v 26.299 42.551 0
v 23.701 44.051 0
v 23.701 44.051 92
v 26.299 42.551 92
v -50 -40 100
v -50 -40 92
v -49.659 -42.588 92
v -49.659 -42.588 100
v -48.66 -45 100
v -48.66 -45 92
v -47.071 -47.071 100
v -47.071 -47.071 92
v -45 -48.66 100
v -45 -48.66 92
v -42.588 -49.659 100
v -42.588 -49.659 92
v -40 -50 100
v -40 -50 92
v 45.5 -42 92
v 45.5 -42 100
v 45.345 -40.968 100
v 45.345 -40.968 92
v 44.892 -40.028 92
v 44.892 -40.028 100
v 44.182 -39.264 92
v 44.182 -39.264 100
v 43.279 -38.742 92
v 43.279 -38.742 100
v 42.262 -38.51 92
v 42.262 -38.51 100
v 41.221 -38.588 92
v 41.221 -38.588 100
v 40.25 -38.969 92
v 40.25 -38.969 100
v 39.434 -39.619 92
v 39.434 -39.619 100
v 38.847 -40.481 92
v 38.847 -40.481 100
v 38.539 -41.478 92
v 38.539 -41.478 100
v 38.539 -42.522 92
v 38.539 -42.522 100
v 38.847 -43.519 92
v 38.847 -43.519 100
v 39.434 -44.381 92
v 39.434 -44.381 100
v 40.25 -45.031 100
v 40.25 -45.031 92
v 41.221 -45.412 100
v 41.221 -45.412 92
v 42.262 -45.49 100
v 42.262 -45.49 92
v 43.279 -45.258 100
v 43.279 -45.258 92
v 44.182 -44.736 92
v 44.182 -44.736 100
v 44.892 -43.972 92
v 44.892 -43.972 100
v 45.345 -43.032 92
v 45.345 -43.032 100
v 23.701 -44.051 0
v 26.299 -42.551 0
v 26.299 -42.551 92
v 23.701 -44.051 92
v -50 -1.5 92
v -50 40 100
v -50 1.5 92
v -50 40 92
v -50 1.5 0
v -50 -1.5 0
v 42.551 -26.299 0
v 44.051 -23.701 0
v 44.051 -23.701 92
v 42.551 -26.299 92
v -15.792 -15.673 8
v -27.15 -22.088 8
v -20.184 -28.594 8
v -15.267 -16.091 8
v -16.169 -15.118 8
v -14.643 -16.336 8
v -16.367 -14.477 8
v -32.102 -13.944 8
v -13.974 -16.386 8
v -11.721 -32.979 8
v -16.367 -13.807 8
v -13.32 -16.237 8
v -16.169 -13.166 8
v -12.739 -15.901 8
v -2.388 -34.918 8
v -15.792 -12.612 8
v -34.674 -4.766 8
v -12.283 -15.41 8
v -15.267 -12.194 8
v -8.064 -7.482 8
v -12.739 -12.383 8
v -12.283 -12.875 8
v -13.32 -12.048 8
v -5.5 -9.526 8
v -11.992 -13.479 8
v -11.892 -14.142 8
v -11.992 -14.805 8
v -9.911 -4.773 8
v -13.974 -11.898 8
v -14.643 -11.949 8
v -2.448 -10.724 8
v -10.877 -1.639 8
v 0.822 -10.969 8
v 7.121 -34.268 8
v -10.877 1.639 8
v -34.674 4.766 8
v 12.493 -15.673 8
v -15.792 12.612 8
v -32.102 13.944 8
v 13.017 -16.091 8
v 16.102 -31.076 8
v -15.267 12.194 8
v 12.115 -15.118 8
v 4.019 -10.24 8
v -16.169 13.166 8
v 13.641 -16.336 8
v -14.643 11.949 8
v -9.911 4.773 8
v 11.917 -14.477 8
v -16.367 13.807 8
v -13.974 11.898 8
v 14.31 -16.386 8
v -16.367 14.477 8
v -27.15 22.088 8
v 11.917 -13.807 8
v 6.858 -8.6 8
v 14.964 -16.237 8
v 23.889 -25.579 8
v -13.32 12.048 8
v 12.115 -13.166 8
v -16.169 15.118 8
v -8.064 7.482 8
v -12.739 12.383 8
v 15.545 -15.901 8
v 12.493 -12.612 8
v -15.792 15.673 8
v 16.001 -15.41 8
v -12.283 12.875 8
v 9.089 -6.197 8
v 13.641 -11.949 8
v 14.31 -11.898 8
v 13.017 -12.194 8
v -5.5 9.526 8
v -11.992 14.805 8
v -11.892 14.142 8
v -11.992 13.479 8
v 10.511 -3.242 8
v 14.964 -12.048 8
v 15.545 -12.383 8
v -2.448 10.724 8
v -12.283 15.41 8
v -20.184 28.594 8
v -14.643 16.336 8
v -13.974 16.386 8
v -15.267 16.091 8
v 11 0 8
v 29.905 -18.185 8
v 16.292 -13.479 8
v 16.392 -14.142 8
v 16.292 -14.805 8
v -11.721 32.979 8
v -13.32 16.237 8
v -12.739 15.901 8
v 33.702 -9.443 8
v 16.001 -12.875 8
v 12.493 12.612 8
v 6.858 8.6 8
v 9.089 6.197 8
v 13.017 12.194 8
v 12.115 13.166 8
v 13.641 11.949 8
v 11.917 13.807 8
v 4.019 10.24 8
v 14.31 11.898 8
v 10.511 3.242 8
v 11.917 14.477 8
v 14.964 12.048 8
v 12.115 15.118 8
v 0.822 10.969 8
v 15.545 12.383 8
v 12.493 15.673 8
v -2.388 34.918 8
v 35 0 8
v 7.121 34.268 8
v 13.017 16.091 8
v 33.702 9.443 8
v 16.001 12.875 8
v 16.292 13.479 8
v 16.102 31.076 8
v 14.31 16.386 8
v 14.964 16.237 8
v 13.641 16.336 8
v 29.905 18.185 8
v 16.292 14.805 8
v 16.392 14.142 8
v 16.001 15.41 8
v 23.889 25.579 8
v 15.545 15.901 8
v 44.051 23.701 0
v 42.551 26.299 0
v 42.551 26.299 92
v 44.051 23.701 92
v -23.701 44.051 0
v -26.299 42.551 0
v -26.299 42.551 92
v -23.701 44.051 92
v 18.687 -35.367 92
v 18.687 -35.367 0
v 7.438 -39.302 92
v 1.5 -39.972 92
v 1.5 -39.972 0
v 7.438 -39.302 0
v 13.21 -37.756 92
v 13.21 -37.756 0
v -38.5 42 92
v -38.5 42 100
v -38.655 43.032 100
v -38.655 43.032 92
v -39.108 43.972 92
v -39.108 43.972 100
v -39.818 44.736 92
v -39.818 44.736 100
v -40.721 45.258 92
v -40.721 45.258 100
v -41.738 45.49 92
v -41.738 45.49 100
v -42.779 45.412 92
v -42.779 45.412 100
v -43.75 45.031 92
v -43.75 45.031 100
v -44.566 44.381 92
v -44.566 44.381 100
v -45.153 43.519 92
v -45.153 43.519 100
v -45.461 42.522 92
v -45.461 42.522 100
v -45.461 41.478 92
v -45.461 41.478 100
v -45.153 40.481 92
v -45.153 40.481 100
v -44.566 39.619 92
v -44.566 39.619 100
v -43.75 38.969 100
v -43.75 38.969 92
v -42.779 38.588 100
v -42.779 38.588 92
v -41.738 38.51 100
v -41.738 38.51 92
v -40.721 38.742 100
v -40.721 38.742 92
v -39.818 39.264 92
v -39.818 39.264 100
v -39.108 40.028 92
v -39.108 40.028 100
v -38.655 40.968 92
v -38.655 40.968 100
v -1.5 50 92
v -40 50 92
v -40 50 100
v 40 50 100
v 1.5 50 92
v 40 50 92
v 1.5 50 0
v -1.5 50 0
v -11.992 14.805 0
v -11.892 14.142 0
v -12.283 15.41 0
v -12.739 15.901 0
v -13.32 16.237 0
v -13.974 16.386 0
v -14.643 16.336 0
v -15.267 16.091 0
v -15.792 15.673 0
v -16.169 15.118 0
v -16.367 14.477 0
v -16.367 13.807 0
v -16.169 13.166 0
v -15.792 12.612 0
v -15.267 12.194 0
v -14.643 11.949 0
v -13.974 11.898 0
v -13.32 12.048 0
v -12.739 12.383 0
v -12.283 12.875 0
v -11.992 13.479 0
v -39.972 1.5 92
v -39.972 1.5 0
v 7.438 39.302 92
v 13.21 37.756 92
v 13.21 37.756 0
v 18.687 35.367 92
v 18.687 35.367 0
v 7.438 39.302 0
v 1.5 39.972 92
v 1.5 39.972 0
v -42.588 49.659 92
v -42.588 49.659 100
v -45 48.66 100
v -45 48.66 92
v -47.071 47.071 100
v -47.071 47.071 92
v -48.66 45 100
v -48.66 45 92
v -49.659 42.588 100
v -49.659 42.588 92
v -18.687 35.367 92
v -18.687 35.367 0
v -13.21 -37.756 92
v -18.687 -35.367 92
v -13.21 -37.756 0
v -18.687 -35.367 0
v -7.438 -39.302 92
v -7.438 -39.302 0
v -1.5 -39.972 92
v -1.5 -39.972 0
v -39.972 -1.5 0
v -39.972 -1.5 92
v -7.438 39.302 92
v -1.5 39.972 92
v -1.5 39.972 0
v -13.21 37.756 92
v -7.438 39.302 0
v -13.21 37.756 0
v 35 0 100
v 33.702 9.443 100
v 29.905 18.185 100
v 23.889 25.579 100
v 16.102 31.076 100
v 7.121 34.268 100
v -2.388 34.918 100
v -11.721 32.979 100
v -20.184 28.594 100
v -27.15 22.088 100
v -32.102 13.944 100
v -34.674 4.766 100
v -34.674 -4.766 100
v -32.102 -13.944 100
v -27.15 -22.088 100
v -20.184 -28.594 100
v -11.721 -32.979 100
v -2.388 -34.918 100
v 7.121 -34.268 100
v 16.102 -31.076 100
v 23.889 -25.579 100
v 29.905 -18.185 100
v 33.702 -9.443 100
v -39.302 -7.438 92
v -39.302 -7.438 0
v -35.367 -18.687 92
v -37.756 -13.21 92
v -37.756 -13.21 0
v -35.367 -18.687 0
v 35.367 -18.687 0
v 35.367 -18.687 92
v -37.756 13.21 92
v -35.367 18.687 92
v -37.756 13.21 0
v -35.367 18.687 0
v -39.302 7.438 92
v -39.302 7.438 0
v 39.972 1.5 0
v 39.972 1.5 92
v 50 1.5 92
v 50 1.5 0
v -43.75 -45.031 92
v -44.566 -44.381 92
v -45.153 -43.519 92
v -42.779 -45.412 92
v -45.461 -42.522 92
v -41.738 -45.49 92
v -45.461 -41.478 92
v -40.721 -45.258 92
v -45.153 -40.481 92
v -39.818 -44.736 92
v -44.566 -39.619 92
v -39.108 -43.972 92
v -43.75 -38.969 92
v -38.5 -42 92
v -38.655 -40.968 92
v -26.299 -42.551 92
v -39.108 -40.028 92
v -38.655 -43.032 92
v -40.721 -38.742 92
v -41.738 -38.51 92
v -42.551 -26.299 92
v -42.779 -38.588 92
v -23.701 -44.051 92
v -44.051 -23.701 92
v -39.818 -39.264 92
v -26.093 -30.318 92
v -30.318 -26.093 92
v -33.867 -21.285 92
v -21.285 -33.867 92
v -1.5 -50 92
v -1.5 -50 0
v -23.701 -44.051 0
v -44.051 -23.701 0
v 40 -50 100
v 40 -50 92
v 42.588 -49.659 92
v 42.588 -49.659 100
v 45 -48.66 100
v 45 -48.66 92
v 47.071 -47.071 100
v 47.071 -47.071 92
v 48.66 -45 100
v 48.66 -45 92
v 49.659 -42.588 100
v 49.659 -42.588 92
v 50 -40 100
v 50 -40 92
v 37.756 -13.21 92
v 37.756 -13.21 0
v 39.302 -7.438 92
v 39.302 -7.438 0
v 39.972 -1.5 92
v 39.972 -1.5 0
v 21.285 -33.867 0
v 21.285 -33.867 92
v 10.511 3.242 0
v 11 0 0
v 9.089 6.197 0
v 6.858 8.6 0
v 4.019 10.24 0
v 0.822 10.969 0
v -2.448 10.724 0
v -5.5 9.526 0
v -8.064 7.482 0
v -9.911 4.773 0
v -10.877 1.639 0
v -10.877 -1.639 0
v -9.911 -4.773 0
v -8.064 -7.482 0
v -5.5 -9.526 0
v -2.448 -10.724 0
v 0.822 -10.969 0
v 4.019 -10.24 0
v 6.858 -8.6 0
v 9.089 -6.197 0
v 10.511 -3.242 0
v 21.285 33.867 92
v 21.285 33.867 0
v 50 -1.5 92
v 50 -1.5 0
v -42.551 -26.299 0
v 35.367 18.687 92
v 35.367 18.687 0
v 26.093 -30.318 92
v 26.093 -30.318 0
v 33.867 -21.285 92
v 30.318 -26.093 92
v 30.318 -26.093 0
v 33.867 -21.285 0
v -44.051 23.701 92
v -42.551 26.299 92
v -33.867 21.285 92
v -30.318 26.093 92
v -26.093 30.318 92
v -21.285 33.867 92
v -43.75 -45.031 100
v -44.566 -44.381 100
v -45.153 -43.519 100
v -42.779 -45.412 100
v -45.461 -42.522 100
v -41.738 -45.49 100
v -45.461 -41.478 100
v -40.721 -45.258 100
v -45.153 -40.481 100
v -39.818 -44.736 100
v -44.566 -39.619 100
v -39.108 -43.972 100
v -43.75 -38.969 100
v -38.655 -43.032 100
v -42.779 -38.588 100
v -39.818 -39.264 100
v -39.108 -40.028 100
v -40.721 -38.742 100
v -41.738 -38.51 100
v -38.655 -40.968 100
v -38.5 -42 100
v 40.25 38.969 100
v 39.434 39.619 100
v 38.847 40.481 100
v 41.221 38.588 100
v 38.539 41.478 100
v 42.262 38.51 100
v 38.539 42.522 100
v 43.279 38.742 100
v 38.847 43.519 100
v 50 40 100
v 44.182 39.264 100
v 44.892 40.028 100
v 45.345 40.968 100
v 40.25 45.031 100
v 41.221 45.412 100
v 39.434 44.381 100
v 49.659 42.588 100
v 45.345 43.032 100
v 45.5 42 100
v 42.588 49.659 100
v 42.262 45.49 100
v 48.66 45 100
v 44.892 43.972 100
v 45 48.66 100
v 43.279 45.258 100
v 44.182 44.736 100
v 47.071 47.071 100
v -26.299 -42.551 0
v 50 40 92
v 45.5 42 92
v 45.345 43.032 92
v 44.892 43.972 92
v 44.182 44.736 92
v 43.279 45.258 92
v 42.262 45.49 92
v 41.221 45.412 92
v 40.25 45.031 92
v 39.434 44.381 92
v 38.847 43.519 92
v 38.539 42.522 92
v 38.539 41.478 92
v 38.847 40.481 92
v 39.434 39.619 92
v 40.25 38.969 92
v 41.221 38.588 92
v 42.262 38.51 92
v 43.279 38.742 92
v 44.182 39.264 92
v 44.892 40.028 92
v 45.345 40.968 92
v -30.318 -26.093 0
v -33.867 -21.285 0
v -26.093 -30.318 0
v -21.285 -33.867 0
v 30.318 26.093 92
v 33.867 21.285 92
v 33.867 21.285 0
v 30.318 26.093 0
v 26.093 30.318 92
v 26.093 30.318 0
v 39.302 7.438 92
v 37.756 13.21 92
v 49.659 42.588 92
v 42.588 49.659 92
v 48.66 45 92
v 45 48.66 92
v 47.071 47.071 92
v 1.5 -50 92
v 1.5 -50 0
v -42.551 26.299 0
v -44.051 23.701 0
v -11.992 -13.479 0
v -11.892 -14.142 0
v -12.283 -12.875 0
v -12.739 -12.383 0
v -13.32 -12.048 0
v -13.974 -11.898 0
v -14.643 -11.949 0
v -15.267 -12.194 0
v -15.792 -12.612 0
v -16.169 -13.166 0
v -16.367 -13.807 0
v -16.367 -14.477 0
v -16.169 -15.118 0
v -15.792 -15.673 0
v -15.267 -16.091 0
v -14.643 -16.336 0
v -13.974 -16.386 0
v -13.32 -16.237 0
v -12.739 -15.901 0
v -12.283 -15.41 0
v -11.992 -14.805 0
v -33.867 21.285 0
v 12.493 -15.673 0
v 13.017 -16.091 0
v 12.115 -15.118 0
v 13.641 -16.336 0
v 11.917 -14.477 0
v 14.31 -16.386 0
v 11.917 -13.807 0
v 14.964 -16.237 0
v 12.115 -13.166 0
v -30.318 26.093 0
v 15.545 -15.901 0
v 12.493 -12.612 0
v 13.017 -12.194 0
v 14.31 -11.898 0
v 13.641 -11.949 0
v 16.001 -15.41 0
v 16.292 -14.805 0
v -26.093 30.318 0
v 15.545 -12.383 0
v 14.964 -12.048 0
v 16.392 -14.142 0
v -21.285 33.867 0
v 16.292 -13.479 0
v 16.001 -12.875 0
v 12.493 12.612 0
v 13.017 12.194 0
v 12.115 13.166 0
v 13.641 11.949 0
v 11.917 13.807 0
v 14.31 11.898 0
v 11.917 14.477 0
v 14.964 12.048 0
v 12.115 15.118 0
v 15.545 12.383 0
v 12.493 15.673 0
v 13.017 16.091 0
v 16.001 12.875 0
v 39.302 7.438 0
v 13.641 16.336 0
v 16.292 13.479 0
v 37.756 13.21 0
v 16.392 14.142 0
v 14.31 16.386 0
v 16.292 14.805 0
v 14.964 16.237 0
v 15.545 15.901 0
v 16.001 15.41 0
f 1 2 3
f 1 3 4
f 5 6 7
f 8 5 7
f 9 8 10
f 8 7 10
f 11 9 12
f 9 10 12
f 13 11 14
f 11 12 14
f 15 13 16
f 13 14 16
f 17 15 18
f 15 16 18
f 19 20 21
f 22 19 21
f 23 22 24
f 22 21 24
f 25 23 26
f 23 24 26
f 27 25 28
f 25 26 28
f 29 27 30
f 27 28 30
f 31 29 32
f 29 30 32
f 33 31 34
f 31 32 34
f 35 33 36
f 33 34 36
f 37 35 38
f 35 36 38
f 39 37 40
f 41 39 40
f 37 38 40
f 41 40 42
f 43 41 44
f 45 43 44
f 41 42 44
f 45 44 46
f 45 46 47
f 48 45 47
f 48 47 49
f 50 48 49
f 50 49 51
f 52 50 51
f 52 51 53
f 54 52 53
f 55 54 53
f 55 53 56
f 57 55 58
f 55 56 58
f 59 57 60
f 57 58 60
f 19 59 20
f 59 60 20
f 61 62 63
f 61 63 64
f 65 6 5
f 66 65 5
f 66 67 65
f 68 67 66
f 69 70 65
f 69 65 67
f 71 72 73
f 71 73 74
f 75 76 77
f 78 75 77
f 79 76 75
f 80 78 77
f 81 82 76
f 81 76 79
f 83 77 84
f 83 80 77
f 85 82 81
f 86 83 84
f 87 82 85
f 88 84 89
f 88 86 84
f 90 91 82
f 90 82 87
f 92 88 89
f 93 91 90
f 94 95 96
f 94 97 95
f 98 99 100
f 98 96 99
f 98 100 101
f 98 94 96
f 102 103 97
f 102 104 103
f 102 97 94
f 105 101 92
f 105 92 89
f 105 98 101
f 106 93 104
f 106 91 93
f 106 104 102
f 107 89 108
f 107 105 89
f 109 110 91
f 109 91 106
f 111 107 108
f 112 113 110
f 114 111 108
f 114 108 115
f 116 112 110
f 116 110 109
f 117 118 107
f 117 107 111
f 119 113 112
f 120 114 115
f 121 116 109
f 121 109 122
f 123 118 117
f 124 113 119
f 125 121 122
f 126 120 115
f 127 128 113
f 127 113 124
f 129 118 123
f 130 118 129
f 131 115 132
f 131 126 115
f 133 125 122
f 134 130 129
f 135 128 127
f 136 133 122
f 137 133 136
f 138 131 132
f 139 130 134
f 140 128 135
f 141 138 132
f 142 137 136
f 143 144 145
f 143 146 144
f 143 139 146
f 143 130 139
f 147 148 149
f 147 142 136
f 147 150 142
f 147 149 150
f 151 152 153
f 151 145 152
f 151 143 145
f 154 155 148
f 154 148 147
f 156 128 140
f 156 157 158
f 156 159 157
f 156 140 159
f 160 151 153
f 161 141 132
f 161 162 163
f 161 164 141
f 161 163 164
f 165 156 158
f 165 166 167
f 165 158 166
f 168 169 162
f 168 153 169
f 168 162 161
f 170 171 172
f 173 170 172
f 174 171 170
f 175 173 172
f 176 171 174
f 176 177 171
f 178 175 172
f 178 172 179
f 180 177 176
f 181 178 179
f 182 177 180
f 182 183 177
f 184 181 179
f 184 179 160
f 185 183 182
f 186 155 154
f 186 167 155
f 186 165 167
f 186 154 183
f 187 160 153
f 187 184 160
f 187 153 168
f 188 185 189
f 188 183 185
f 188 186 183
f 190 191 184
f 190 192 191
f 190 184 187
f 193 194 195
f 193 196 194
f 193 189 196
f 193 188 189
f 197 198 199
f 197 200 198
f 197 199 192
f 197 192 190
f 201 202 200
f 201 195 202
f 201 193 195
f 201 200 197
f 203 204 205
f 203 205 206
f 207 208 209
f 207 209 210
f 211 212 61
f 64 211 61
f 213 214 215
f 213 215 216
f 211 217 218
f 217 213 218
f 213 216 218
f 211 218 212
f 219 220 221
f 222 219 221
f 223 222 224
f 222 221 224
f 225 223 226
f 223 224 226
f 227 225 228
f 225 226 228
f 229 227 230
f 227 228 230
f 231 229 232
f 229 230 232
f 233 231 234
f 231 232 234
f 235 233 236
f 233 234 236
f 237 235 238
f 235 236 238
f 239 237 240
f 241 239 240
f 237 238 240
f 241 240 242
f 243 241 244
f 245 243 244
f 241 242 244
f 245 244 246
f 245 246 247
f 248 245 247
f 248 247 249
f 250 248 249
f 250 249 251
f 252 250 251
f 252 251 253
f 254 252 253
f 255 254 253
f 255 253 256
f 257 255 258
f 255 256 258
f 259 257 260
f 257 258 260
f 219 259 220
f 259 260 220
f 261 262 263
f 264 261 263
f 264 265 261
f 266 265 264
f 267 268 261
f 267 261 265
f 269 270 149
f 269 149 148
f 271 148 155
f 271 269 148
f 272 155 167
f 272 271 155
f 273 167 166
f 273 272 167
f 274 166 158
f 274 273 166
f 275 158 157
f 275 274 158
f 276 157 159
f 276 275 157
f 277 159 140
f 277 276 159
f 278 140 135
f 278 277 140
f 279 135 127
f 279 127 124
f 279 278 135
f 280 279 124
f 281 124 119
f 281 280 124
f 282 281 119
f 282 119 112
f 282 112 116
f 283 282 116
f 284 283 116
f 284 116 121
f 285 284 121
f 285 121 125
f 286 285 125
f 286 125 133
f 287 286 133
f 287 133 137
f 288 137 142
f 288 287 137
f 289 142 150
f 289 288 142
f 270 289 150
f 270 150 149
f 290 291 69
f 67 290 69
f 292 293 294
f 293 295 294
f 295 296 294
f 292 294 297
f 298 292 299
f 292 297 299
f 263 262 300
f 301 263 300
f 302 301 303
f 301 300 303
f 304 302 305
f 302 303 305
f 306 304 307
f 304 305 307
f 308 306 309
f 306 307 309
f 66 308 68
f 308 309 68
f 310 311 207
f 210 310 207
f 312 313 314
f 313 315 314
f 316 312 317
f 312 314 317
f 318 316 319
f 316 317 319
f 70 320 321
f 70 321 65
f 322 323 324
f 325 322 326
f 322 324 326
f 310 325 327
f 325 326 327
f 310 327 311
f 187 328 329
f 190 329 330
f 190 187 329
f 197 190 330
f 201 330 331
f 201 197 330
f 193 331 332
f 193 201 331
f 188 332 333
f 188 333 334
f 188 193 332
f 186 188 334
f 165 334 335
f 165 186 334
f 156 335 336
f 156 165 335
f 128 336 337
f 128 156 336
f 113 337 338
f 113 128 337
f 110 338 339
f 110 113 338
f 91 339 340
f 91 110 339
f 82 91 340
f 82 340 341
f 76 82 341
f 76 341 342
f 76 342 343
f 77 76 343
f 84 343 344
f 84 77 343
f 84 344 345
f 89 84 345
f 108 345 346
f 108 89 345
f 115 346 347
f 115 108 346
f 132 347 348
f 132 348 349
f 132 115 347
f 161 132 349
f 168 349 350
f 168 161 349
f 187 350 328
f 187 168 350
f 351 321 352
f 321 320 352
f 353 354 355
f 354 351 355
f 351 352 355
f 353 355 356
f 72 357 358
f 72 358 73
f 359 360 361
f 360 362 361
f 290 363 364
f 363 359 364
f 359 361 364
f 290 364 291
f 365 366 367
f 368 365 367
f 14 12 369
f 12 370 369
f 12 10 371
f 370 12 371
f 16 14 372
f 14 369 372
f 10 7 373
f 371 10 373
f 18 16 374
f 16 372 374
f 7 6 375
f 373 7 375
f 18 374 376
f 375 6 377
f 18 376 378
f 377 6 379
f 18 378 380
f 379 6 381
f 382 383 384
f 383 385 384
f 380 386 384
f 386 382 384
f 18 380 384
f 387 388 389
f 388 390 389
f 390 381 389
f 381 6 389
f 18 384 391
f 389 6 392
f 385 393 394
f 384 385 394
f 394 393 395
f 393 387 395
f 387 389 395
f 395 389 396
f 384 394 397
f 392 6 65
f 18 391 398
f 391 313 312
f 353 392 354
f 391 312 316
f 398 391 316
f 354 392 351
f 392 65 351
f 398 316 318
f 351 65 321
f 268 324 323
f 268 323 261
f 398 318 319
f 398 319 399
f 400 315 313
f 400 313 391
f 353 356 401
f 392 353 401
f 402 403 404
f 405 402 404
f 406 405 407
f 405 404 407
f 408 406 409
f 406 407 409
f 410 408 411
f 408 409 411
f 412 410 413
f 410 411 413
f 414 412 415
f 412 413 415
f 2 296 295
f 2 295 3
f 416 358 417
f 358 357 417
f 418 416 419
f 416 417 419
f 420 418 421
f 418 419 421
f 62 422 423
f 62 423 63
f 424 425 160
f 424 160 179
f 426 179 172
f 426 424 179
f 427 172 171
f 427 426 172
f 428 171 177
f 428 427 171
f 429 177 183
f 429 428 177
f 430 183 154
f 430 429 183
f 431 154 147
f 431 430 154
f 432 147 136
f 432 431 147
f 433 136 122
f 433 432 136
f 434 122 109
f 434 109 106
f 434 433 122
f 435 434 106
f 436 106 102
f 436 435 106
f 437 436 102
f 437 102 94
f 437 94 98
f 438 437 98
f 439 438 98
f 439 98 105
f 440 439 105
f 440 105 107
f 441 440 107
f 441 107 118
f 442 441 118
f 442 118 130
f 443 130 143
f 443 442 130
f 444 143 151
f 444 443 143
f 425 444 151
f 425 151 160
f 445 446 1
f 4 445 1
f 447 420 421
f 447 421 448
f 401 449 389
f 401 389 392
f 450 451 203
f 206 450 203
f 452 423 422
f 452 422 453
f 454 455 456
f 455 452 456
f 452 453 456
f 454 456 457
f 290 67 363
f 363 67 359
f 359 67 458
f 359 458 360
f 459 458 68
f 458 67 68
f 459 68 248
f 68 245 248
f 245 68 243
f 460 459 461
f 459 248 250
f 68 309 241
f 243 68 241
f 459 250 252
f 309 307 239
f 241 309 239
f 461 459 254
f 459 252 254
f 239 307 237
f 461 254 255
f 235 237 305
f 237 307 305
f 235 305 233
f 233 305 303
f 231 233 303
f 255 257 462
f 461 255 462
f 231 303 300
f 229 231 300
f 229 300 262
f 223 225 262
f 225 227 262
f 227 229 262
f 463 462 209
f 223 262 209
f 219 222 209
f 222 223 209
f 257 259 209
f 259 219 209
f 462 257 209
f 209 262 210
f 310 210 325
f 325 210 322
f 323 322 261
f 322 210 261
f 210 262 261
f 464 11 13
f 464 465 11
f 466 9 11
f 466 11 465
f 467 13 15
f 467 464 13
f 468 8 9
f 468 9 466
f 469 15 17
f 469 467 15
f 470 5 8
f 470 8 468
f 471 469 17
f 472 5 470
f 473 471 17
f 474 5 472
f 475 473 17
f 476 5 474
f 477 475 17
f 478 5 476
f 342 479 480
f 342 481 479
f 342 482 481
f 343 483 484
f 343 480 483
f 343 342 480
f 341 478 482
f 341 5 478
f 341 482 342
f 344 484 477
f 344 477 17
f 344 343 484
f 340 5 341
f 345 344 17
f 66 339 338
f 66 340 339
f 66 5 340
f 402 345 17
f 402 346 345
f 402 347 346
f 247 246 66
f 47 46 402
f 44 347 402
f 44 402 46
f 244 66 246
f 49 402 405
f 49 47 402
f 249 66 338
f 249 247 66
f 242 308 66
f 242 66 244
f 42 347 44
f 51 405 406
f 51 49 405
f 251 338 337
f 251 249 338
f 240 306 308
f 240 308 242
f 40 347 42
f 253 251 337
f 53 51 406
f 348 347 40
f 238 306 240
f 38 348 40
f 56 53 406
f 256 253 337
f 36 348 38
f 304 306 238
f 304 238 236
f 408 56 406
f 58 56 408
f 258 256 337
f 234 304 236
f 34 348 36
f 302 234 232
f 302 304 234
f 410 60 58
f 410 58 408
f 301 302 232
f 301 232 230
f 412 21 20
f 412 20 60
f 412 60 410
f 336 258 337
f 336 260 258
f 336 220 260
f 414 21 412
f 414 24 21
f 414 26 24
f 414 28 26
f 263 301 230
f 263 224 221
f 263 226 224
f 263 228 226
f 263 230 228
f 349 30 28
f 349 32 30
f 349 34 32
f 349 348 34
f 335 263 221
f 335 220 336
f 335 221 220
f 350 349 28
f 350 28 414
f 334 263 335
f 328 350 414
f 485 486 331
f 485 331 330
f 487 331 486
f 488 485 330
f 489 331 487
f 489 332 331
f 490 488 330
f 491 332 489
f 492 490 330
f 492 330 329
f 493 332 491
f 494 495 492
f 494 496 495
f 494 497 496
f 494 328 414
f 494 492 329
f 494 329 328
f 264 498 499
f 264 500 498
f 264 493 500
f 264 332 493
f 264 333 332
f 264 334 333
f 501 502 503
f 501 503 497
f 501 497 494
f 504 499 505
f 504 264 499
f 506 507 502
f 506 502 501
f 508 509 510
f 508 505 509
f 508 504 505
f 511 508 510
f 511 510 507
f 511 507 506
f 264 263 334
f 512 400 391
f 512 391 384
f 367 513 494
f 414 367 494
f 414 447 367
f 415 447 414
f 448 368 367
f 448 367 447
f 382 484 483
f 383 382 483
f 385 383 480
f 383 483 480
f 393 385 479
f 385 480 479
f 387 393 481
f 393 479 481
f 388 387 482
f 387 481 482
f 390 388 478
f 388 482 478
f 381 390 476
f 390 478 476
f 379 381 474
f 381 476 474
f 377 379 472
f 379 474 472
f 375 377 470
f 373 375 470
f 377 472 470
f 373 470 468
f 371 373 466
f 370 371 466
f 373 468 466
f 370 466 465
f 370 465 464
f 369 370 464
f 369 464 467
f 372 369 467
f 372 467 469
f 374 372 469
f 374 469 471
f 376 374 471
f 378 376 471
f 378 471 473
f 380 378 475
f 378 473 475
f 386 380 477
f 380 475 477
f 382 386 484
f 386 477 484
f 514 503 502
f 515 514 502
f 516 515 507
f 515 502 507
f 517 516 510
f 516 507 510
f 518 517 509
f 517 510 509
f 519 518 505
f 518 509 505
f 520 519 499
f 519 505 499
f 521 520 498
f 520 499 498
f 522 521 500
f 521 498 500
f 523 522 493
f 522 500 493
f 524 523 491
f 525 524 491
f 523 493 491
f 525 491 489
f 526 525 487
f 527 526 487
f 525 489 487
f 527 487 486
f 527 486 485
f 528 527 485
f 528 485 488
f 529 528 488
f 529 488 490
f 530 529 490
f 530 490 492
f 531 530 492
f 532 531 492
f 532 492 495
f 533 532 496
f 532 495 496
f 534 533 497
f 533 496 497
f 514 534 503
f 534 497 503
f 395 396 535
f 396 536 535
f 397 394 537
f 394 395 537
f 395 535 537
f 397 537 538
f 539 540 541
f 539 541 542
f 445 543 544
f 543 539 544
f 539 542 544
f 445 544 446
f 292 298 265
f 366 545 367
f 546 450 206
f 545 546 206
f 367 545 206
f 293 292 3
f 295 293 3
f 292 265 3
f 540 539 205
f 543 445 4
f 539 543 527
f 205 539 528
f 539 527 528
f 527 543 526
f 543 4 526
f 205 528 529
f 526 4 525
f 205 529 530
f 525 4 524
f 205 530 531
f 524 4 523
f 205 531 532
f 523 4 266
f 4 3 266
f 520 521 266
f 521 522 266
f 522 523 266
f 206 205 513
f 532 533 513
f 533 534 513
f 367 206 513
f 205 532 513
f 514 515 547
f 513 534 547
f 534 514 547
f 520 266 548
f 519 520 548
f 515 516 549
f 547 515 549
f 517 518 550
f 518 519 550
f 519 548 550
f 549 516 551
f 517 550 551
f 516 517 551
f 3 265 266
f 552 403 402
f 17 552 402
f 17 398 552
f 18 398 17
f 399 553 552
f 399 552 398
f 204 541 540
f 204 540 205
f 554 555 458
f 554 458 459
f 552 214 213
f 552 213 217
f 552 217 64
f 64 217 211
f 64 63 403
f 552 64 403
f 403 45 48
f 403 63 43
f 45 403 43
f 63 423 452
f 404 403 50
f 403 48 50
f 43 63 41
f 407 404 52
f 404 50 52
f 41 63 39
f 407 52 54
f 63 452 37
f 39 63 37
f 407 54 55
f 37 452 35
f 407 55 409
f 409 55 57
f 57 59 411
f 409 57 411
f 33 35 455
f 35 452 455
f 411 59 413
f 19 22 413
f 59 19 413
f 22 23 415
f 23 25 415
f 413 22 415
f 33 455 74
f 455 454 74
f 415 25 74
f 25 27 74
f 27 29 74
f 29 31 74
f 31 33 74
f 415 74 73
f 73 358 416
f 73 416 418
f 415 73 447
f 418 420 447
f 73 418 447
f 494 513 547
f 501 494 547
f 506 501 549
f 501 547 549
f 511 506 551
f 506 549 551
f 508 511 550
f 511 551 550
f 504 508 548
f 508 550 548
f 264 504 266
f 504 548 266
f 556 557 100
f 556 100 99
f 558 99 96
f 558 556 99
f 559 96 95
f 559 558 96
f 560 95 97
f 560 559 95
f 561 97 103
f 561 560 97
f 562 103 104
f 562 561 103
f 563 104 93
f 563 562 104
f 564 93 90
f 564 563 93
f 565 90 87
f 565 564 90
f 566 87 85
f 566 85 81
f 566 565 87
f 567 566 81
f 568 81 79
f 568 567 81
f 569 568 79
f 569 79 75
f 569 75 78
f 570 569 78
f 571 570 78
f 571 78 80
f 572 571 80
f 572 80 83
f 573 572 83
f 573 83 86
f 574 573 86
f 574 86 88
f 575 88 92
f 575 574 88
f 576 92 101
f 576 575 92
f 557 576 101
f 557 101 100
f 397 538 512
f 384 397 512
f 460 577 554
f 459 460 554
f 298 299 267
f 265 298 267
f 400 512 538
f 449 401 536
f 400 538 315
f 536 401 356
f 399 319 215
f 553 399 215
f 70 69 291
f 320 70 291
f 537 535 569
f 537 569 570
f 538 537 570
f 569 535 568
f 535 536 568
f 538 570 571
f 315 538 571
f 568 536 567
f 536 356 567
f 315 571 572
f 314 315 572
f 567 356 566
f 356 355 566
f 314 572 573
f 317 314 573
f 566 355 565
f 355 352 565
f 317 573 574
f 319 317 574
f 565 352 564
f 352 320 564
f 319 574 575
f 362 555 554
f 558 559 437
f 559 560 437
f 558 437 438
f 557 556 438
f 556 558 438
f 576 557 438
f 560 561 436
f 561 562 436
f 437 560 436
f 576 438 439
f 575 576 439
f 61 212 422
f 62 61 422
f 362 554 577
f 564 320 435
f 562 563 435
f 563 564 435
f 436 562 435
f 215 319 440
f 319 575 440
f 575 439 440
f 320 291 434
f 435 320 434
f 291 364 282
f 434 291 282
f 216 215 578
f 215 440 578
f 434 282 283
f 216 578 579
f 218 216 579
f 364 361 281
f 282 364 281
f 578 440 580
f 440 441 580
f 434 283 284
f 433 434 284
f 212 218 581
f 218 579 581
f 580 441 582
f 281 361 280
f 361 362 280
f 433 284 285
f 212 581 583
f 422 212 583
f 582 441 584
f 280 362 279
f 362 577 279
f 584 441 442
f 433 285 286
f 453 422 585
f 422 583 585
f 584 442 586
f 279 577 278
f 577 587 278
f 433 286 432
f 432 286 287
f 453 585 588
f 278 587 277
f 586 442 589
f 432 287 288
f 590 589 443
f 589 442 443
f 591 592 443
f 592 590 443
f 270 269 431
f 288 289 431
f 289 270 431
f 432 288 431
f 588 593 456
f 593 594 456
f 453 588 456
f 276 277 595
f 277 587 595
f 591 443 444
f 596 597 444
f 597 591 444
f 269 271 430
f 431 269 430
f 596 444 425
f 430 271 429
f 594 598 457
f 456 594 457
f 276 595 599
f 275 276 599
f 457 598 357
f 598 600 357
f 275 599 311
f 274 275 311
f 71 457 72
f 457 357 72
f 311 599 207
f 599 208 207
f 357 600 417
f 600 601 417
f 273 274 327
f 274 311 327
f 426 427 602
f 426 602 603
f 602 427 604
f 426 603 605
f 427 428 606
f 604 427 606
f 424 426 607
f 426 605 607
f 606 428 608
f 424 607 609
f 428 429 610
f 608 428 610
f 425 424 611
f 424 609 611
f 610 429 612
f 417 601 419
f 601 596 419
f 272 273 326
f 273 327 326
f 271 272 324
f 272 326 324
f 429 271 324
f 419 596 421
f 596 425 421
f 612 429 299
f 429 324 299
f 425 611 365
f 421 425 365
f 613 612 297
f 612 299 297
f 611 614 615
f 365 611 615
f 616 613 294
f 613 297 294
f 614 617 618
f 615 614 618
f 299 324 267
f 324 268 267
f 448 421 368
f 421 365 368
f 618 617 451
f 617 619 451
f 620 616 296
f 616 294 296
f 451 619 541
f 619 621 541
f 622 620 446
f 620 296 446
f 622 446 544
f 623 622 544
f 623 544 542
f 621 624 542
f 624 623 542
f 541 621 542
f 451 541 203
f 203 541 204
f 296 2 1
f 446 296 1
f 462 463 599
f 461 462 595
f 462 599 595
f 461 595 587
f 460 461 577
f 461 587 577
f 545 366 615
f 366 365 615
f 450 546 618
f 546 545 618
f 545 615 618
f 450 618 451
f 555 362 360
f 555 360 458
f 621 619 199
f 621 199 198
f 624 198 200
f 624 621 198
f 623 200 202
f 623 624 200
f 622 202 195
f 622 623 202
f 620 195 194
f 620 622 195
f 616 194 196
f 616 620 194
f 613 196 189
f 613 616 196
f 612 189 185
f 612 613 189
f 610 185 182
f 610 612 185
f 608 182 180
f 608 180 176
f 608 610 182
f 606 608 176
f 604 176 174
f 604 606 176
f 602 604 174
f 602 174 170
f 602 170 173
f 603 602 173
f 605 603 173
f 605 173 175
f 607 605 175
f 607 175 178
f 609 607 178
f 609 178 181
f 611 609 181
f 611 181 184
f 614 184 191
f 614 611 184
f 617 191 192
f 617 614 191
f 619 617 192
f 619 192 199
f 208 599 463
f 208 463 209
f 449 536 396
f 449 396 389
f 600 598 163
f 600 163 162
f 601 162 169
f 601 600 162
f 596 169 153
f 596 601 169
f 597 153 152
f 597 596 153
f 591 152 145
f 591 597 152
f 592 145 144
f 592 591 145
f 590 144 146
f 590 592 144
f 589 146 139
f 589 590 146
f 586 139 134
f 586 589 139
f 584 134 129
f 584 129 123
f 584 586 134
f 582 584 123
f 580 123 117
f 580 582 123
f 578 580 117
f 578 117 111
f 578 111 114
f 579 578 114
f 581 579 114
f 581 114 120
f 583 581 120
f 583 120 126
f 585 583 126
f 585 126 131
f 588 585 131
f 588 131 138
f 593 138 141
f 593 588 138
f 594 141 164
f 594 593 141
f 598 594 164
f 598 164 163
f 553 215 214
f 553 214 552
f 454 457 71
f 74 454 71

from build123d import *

# Parameters (mm, degrees)
SKETCH_1_R               = 40
EXTRUDE_1_DEPTH          = 100
SKETCH_2_R               = 35
CUT_EXTRUDE_1_DEPTH      = 92
SKETCH_3_R               = 35
EXTRUDE_2_DEPTH          = 8
SKETCH_4_W               = 3
SKETCH_4_H               = 11
EXTRUDE_3_DEPTH          = 92
PATTERN_CIRCULAR_1_COUNT = 12
SKETCH_5_R               = 11
CUT_EXTRUDE_2_DEPTH      = 8
SKETCH_6_R               = 3.5
CUT_EXTRUDE_3_DEPTH      = 8
SKETCH_7_R               = 2.25
CUT_EXTRUDE_4_DEPTH      = 8


with BuildPart() as part:
    # 草图1 → 凸台-拉伸1 (new body)
    with BuildSketch(Plane.XY):
        Circle(SKETCH_1_R)
    extrude(amount=EXTRUDE_1_DEPTH)

    # 草图2 → 切除-拉伸1 (cut)
    with BuildSketch(Plane.XY.offset(8)):
        Circle(SKETCH_2_R)
    extrude(amount=CUT_EXTRUDE_1_DEPTH, mode=Mode.SUBTRACT)

    # 草图3 → 凸台-拉伸2 (add)
    with BuildSketch(Plane.XY.offset(92)):
        with BuildLine():
            Line((-40, -50), (40, -50))
            ThreePointArc((40, -50), (47.071067812, -47.071067812), (50, -40))
            Line((50, -40), (50, 40))
            ThreePointArc((50, 40), (47.071067812, 47.071067812), (40, 50))
            Line((40, 50), (-40, 50))
            ThreePointArc((-40, 50), (-47.071067812, 47.071067812), (-50, 40))
            Line((-50, 40), (-50, -40))
            ThreePointArc((-50, -40), (-47.071067812, -47.071067812), (-40, -50))
        make_face()
        Circle(SKETCH_3_R, mode=Mode.SUBTRACT)
    extrude(amount=EXTRUDE_2_DEPTH)

    # 草图4 → 凸台-拉伸3 (add)
    with BuildSketch(Plane.XY):
        with Locations((0, 44.5)):
            Rectangle(SKETCH_4_W, SKETCH_4_H)
    extrude_3 = extrude(amount=EXTRUDE_3_DEPTH)

    # 阵列(圆周)1: 凸台-拉伸3 ×12 about axis
    pattern_circular_1_axis = Axis((0, 0, 105), (0, 0, -1))
    for i in range(1, PATTERN_CIRCULAR_1_COUNT):
        add(extrude_3.rotate(pattern_circular_1_axis, i * 360 / PATTERN_CIRCULAR_1_COUNT))

    # 草图5 → 切除-拉伸2 (cut)
    with BuildSketch(Plane.XY):
        Circle(SKETCH_5_R)
    extrude(amount=CUT_EXTRUDE_2_DEPTH, mode=Mode.SUBTRACT)

    # 草图6 → 切除-拉伸3 (cut)
    with BuildSketch(Plane.XY.offset(100)):
        with Locations((42, 42)):
            Circle(SKETCH_6_R)
        with Locations((-42, 42)):
            Circle(SKETCH_6_R)
        with Locations((-42, -42)):
            Circle(SKETCH_6_R)
        with Locations((42, -42)):
            Circle(SKETCH_6_R)
    extrude(amount=-CUT_EXTRUDE_3_DEPTH, mode=Mode.SUBTRACT)

    # 草图7 → 切除-拉伸4 (cut)
    with BuildSketch(Plane.XY):
        with Locations((14.142136, 14.142136)):
            Circle(SKETCH_7_R)
        with Locations((-14.142136, 14.142136)):
            Circle(SKETCH_7_R)
        with Locations((-14.142136, -14.142136)):
            Circle(SKETCH_7_R)
        with Locations((14.142136, -14.142136)):
            Circle(SKETCH_7_R)
    extrude(amount=CUT_EXTRUDE_4_DEPTH, mode=Mode.SUBTRACT)


solid = part.part
